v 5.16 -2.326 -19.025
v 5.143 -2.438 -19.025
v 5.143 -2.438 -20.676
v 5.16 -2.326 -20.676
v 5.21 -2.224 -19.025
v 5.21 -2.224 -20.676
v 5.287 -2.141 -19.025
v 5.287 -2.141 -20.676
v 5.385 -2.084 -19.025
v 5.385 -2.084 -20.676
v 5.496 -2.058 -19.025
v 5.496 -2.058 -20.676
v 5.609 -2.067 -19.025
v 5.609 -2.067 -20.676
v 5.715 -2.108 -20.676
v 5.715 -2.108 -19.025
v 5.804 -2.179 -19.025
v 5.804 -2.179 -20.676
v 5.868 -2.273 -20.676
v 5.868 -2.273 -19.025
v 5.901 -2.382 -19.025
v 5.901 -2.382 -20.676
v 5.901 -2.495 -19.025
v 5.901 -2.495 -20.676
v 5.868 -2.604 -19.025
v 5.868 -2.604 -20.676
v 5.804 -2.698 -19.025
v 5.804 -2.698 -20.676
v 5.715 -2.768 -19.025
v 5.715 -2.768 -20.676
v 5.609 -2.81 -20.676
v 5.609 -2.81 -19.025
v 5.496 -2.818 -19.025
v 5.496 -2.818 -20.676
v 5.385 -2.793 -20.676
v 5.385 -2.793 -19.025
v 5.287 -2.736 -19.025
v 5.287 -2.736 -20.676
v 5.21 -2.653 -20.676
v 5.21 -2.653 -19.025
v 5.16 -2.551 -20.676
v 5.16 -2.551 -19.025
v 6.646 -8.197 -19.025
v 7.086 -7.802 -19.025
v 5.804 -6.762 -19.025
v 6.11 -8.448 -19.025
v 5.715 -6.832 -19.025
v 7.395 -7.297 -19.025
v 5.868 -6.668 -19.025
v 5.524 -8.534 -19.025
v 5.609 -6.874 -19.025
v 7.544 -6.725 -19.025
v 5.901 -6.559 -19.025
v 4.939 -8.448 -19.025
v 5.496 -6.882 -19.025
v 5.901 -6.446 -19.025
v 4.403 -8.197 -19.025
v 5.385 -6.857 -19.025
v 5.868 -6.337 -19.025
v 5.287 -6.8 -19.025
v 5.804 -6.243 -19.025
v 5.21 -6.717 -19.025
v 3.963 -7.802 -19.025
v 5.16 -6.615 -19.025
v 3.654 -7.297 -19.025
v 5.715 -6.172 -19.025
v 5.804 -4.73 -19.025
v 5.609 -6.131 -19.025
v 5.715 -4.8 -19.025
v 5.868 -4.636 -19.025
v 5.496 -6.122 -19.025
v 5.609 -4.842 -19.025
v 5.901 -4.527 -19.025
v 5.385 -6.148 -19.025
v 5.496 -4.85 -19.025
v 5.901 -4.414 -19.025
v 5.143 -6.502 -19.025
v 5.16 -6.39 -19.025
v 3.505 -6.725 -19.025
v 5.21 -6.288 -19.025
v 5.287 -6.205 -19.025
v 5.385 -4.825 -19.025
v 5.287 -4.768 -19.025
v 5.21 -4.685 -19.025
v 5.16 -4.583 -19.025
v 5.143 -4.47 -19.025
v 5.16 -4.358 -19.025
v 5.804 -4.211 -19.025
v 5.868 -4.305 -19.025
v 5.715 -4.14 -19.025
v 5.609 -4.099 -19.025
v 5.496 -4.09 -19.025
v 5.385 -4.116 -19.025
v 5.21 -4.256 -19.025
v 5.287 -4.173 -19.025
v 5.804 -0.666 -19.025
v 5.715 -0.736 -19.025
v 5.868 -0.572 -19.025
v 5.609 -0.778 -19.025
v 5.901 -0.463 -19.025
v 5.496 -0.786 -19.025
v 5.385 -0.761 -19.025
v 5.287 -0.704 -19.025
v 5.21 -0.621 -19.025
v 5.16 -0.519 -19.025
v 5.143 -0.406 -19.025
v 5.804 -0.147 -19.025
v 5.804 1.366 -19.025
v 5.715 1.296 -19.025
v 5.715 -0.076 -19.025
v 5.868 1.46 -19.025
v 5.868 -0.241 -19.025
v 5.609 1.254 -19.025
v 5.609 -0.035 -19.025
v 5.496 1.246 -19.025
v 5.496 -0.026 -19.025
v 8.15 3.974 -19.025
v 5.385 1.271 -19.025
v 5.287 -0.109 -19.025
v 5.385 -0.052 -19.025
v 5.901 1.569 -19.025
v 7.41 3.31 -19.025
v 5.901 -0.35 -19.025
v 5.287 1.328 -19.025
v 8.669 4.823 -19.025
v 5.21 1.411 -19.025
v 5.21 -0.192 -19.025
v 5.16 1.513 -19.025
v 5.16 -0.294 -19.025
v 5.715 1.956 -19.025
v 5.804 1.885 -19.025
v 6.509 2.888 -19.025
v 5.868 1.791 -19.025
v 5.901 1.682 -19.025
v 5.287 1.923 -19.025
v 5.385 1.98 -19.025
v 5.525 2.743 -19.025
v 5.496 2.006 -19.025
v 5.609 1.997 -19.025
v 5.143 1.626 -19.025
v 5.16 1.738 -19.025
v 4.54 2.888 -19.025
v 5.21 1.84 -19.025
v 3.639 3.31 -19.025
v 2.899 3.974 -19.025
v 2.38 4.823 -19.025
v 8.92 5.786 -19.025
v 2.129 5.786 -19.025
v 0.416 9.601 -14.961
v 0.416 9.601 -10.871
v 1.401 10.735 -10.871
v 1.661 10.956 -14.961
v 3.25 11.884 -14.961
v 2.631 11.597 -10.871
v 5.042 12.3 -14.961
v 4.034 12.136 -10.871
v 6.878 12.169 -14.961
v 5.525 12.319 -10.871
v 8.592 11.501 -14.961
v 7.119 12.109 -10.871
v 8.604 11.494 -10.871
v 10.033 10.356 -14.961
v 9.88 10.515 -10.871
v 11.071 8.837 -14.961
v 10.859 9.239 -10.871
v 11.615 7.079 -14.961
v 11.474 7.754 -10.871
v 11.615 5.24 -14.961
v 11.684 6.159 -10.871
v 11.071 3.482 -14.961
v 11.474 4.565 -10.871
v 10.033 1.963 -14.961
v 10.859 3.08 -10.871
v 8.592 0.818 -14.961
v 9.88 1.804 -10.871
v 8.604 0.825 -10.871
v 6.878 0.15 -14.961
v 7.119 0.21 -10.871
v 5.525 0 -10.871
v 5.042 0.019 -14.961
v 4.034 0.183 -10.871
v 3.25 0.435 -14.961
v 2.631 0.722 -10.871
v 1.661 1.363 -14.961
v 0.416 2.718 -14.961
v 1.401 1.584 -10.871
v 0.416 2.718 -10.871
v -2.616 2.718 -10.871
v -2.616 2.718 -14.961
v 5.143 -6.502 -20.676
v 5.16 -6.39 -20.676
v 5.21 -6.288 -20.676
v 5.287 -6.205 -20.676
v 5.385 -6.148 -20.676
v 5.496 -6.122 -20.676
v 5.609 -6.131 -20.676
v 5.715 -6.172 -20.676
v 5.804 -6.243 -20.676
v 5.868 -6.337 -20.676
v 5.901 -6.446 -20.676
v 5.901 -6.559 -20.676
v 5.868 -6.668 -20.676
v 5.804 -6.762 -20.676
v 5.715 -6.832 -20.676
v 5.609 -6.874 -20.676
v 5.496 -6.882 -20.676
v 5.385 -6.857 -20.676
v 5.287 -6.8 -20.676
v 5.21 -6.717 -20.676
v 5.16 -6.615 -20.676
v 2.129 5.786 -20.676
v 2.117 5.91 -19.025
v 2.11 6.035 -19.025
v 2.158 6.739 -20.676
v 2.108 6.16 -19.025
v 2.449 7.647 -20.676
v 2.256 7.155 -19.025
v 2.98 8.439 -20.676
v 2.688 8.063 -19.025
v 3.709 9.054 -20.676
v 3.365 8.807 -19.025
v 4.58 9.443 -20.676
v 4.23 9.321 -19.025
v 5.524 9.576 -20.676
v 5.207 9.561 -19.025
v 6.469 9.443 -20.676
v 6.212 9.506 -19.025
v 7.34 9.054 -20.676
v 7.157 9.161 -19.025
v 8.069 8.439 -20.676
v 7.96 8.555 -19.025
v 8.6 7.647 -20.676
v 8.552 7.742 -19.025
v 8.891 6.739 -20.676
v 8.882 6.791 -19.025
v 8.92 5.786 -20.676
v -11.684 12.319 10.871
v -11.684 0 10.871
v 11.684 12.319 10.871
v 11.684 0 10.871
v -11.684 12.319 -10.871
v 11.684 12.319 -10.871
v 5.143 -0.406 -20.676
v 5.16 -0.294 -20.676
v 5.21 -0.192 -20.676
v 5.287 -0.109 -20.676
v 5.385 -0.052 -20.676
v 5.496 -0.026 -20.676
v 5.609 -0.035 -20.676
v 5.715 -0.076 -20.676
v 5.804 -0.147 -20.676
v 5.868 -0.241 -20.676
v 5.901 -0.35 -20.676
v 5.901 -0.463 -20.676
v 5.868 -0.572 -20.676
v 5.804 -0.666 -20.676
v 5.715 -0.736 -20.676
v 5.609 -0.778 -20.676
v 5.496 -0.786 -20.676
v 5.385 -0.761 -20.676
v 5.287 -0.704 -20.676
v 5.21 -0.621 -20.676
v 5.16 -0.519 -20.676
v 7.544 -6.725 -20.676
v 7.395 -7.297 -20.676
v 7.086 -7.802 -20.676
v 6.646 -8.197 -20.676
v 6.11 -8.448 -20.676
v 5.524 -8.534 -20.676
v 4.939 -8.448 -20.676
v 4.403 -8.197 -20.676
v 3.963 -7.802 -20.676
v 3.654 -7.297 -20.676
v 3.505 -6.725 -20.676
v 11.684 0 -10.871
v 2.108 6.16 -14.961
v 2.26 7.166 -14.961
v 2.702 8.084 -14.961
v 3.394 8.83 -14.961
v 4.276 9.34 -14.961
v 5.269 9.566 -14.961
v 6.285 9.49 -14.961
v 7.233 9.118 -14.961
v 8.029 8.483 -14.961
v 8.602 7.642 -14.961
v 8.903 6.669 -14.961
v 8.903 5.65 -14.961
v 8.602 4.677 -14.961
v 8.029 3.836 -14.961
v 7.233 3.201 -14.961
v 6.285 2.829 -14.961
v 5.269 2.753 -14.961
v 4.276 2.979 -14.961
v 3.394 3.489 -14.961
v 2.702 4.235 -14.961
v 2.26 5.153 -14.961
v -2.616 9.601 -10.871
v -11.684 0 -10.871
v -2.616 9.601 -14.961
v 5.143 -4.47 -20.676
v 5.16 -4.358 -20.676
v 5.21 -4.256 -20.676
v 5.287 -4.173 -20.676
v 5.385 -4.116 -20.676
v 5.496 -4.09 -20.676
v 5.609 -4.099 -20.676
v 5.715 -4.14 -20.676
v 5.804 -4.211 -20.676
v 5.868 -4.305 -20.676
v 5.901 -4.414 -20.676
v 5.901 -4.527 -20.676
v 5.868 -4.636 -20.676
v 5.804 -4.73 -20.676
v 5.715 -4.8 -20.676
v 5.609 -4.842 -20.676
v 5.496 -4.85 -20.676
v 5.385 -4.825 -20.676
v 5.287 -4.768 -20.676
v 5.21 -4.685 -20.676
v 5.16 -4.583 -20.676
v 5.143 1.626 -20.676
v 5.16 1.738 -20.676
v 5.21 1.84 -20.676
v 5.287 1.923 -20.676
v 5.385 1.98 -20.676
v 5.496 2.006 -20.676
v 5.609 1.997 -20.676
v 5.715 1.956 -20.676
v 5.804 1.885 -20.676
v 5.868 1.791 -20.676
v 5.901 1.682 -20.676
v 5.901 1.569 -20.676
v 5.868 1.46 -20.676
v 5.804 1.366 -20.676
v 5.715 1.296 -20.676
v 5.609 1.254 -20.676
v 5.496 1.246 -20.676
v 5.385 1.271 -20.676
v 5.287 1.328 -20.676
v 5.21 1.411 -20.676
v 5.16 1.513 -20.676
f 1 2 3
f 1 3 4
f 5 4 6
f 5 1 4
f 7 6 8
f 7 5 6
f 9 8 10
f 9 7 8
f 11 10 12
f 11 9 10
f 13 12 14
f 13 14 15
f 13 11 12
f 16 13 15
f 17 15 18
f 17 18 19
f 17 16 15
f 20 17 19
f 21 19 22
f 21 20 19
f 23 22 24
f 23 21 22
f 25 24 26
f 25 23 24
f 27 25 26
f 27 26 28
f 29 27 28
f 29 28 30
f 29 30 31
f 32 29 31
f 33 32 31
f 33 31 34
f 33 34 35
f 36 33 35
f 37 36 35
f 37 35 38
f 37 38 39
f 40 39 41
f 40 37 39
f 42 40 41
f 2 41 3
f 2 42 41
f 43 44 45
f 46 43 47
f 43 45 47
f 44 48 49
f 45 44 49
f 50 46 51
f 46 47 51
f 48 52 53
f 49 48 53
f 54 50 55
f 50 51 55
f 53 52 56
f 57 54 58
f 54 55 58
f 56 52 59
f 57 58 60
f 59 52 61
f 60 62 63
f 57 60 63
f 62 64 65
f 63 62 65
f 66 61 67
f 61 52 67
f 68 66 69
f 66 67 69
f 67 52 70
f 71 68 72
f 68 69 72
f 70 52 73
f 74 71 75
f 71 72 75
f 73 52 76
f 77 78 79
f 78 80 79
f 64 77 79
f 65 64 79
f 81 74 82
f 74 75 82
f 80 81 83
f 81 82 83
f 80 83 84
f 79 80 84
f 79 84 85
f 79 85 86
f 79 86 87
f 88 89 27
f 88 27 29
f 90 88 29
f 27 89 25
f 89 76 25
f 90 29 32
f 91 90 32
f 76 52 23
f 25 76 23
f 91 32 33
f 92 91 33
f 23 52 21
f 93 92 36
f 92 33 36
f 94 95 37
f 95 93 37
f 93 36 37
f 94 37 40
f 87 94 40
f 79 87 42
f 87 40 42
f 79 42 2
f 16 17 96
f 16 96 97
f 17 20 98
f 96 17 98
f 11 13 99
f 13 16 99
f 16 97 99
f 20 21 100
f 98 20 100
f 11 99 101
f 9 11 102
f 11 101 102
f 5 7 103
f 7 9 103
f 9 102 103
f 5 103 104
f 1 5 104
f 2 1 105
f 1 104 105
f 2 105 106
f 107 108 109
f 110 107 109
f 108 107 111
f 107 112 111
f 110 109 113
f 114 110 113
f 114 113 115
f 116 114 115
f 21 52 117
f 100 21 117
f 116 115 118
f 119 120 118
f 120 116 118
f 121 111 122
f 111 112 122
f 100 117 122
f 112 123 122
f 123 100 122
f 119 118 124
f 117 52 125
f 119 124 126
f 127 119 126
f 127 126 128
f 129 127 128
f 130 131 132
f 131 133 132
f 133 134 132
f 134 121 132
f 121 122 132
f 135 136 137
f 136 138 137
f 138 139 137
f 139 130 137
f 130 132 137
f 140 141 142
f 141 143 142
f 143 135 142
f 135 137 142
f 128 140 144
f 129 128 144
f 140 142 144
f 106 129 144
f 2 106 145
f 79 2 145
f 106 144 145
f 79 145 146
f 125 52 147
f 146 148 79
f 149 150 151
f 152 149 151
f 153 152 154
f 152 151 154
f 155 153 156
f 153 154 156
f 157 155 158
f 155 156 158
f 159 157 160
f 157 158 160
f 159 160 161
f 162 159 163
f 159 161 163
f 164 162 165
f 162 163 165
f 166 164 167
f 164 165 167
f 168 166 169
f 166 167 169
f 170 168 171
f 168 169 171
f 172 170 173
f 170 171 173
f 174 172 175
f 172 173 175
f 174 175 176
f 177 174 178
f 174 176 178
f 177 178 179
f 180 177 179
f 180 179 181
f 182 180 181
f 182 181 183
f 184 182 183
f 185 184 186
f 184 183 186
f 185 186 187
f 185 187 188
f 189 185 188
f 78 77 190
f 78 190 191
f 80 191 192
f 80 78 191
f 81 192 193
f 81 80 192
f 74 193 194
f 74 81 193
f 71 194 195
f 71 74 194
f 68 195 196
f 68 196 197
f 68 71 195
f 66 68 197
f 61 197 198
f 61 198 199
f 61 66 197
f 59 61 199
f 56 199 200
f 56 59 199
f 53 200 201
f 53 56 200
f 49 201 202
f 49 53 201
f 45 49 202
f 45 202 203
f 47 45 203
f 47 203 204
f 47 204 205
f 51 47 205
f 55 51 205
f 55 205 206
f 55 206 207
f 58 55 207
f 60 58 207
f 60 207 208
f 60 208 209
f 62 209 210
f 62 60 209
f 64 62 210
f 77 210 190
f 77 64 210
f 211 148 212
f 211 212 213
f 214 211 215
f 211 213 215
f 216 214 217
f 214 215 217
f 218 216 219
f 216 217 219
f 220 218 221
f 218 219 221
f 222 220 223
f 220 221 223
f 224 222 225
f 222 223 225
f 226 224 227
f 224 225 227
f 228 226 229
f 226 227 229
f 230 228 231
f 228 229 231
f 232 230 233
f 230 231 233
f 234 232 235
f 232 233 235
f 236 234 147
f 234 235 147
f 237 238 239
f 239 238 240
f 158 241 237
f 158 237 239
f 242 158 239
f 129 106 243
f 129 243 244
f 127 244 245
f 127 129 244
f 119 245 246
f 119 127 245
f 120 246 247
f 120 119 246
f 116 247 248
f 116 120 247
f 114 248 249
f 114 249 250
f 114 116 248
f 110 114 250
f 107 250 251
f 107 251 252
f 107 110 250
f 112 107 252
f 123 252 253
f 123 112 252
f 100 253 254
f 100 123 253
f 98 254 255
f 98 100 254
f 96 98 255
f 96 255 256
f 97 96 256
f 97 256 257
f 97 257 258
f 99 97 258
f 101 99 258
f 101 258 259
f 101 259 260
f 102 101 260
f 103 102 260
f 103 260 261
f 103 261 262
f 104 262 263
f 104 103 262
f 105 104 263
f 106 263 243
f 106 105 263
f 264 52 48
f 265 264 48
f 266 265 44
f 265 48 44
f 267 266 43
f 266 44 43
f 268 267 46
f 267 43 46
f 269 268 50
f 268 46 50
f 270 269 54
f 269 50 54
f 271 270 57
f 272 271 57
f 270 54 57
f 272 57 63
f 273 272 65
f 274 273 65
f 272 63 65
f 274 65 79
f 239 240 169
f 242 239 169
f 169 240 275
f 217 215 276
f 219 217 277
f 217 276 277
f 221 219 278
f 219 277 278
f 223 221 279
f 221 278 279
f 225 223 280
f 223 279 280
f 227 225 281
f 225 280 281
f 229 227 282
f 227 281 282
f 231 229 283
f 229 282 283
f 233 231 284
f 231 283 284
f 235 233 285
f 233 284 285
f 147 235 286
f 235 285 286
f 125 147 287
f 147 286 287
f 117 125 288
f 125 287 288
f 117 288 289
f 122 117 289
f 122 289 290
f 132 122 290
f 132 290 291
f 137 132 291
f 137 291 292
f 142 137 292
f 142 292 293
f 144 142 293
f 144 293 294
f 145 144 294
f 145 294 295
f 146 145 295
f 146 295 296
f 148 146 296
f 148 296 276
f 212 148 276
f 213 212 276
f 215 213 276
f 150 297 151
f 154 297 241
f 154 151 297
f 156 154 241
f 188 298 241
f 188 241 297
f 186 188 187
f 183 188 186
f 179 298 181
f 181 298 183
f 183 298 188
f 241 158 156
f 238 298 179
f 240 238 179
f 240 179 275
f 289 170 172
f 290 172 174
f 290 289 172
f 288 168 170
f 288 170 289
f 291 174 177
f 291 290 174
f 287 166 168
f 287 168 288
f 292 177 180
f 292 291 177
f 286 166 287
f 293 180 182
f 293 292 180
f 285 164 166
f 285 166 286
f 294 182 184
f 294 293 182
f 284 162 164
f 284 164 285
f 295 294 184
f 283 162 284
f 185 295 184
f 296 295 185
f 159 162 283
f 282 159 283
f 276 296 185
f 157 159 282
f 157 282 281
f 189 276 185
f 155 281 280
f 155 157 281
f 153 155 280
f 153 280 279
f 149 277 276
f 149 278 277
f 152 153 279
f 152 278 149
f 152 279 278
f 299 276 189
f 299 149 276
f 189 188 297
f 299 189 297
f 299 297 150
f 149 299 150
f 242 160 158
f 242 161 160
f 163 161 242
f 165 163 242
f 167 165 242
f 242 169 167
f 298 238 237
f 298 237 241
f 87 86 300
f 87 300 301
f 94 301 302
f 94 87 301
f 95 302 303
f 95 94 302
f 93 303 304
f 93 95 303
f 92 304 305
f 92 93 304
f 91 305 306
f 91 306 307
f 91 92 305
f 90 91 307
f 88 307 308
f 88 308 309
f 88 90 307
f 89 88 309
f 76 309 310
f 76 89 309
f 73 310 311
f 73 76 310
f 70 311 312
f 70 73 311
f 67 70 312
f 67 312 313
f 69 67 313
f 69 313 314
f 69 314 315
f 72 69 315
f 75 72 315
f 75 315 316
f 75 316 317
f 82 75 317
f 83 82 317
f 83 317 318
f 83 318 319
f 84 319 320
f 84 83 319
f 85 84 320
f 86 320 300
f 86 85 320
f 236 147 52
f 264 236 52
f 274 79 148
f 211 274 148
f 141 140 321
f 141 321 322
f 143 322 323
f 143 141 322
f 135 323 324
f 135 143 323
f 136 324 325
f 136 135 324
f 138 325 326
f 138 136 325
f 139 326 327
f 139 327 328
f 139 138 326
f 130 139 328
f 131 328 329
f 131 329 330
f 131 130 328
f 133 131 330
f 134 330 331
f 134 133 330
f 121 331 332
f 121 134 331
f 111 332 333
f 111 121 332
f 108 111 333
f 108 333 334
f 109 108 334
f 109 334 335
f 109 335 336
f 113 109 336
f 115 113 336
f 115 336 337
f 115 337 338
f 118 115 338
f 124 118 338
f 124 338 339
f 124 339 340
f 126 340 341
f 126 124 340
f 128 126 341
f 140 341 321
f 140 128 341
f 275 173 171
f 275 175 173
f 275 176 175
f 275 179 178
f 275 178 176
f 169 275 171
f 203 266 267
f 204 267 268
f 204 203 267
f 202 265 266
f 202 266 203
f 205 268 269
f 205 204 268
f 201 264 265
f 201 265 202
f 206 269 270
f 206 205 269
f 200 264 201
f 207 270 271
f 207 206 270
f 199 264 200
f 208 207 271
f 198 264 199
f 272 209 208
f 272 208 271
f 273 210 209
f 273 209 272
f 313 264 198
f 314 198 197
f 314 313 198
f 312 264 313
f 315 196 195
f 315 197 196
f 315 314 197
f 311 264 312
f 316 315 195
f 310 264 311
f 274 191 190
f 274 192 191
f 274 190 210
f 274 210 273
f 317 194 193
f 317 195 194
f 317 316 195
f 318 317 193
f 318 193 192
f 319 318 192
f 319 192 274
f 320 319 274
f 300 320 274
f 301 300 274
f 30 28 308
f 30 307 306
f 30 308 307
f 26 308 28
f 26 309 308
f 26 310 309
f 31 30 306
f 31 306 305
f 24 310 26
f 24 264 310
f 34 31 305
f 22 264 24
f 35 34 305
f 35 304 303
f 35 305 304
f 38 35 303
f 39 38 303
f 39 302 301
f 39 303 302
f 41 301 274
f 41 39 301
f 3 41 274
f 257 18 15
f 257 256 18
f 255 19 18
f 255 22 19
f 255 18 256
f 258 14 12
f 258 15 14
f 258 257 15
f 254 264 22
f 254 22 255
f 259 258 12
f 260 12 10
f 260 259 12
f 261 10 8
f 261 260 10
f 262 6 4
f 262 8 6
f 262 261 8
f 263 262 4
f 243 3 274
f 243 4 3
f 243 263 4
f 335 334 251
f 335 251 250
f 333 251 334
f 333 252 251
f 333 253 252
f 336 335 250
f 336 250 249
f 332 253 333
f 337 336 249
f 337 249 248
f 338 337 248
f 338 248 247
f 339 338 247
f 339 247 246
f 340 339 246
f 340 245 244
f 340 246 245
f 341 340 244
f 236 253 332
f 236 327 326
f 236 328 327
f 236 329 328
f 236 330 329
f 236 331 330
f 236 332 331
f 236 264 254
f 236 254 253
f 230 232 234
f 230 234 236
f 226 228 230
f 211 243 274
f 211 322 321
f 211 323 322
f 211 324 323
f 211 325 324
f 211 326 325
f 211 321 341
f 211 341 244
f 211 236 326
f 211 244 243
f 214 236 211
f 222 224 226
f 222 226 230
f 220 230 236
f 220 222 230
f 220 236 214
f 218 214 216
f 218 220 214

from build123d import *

# Parameters (mm, degrees)
SKETCH1_W           = 23.368
SKETCH1_H           = 21.7424
BOSS_EXTRUDE1_DEPTH = 12.319
BOSS_EXTRUDE2_DEPTH = 4.0894
SKETCH3_R           = 3.4163
BOSS_EXTRUDE3_DEPTH = 4.064
BOSS_EXTRUDE4_DEPTH = 1.651
CUT_EXTRUDE1_START  = -1.651
SKETCH5_R           = 0.381
CUT_EXTRUDE1_DEPTH  = 1.651


with BuildPart() as part:
    # Sketch1 → Boss-Extrude1 (new body)
    with BuildSketch(Plane(origin=(0, 0, 0), x_dir=(1, 0, 0), z_dir=(0, 1, 0))):
        Rectangle(SKETCH1_W, SKETCH1_H)
    extrude(amount=BOSS_EXTRUDE1_DEPTH)

    # Sketch2 → Boss-Extrude2 (add)
    with BuildSketch(Plane(origin=(0, 0, -10.8712), x_dir=(-1, 0, 0), z_dir=(0, 0, -1))):
        with BuildLine():
            Line((-0.416257508, 2.7178), (2.6162, 2.7178))
            Line((2.6162, 2.7178), (2.6162, 9.6012))
            Line((2.6162, 9.6012), (-0.416257508, 9.6012))
            ThreePointArc((-0.416257508, 9.6012), (-11.684, 6.1595), (-0.416257508, 2.7178))
        make_face()
    extrude(amount=BOSS_EXTRUDE2_DEPTH)

    # Sketch3 → Boss-Extrude3 (add)
    with BuildSketch(Plane(origin=(0, 0, -14.9606), x_dir=(-1, 0, 0), z_dir=(0, 0, -1))):
        with Locations((-5.5245, 6.1595)):
            Circle(SKETCH3_R)
    extrude(amount=BOSS_EXTRUDE3_DEPTH)

    # Sketch4 → Boss-Extrude4 (add)
    with BuildSketch(Plane(origin=(0, 0, -19.0246), x_dir=(-1, 0, 0), z_dir=(0, 0, -1))):
        with BuildLine():
            Line((-8.920321777, 5.786002808), (-7.544319644, -6.724554463))
            ThreePointArc((-7.544319644, -6.724554463), (-5.5245, -8.5344), (-3.504680356, -6.724554463))
            Line((-3.504680356, -6.724554463), (-2.128678223, 5.786002808))
            ThreePointArc((-2.128678223, 5.786002808), (-5.5245, 9.5758), (-8.920321777, 5.786002808))
        make_face()
    extrude(amount=BOSS_EXTRUDE4_DEPTH)

    # Sketch5 → Cut-Extrude1 (cut)
    with BuildSketch(Plane(origin=(0, 0, -20.6756), x_dir=(-1, 0, 0), z_dir=(0, 0, -1)).offset(CUT_EXTRUDE1_START)):
        with Locations((-5.5245, -6.5024)):
            Circle(SKETCH5_R)
        with Locations((-5.5245, -4.4704)):
            Circle(SKETCH5_R)
        with Locations((-5.5245, -2.4384)):
            Circle(SKETCH5_R)
        with Locations((-5.5245, -0.4064)):
            Circle(SKETCH5_R)
        with Locations((-5.5245, 1.6256)):
            Circle(SKETCH5_R)
    extrude(amount=CUT_EXTRUDE1_DEPTH, mode=Mode.SUBTRACT)


solid = part.part
